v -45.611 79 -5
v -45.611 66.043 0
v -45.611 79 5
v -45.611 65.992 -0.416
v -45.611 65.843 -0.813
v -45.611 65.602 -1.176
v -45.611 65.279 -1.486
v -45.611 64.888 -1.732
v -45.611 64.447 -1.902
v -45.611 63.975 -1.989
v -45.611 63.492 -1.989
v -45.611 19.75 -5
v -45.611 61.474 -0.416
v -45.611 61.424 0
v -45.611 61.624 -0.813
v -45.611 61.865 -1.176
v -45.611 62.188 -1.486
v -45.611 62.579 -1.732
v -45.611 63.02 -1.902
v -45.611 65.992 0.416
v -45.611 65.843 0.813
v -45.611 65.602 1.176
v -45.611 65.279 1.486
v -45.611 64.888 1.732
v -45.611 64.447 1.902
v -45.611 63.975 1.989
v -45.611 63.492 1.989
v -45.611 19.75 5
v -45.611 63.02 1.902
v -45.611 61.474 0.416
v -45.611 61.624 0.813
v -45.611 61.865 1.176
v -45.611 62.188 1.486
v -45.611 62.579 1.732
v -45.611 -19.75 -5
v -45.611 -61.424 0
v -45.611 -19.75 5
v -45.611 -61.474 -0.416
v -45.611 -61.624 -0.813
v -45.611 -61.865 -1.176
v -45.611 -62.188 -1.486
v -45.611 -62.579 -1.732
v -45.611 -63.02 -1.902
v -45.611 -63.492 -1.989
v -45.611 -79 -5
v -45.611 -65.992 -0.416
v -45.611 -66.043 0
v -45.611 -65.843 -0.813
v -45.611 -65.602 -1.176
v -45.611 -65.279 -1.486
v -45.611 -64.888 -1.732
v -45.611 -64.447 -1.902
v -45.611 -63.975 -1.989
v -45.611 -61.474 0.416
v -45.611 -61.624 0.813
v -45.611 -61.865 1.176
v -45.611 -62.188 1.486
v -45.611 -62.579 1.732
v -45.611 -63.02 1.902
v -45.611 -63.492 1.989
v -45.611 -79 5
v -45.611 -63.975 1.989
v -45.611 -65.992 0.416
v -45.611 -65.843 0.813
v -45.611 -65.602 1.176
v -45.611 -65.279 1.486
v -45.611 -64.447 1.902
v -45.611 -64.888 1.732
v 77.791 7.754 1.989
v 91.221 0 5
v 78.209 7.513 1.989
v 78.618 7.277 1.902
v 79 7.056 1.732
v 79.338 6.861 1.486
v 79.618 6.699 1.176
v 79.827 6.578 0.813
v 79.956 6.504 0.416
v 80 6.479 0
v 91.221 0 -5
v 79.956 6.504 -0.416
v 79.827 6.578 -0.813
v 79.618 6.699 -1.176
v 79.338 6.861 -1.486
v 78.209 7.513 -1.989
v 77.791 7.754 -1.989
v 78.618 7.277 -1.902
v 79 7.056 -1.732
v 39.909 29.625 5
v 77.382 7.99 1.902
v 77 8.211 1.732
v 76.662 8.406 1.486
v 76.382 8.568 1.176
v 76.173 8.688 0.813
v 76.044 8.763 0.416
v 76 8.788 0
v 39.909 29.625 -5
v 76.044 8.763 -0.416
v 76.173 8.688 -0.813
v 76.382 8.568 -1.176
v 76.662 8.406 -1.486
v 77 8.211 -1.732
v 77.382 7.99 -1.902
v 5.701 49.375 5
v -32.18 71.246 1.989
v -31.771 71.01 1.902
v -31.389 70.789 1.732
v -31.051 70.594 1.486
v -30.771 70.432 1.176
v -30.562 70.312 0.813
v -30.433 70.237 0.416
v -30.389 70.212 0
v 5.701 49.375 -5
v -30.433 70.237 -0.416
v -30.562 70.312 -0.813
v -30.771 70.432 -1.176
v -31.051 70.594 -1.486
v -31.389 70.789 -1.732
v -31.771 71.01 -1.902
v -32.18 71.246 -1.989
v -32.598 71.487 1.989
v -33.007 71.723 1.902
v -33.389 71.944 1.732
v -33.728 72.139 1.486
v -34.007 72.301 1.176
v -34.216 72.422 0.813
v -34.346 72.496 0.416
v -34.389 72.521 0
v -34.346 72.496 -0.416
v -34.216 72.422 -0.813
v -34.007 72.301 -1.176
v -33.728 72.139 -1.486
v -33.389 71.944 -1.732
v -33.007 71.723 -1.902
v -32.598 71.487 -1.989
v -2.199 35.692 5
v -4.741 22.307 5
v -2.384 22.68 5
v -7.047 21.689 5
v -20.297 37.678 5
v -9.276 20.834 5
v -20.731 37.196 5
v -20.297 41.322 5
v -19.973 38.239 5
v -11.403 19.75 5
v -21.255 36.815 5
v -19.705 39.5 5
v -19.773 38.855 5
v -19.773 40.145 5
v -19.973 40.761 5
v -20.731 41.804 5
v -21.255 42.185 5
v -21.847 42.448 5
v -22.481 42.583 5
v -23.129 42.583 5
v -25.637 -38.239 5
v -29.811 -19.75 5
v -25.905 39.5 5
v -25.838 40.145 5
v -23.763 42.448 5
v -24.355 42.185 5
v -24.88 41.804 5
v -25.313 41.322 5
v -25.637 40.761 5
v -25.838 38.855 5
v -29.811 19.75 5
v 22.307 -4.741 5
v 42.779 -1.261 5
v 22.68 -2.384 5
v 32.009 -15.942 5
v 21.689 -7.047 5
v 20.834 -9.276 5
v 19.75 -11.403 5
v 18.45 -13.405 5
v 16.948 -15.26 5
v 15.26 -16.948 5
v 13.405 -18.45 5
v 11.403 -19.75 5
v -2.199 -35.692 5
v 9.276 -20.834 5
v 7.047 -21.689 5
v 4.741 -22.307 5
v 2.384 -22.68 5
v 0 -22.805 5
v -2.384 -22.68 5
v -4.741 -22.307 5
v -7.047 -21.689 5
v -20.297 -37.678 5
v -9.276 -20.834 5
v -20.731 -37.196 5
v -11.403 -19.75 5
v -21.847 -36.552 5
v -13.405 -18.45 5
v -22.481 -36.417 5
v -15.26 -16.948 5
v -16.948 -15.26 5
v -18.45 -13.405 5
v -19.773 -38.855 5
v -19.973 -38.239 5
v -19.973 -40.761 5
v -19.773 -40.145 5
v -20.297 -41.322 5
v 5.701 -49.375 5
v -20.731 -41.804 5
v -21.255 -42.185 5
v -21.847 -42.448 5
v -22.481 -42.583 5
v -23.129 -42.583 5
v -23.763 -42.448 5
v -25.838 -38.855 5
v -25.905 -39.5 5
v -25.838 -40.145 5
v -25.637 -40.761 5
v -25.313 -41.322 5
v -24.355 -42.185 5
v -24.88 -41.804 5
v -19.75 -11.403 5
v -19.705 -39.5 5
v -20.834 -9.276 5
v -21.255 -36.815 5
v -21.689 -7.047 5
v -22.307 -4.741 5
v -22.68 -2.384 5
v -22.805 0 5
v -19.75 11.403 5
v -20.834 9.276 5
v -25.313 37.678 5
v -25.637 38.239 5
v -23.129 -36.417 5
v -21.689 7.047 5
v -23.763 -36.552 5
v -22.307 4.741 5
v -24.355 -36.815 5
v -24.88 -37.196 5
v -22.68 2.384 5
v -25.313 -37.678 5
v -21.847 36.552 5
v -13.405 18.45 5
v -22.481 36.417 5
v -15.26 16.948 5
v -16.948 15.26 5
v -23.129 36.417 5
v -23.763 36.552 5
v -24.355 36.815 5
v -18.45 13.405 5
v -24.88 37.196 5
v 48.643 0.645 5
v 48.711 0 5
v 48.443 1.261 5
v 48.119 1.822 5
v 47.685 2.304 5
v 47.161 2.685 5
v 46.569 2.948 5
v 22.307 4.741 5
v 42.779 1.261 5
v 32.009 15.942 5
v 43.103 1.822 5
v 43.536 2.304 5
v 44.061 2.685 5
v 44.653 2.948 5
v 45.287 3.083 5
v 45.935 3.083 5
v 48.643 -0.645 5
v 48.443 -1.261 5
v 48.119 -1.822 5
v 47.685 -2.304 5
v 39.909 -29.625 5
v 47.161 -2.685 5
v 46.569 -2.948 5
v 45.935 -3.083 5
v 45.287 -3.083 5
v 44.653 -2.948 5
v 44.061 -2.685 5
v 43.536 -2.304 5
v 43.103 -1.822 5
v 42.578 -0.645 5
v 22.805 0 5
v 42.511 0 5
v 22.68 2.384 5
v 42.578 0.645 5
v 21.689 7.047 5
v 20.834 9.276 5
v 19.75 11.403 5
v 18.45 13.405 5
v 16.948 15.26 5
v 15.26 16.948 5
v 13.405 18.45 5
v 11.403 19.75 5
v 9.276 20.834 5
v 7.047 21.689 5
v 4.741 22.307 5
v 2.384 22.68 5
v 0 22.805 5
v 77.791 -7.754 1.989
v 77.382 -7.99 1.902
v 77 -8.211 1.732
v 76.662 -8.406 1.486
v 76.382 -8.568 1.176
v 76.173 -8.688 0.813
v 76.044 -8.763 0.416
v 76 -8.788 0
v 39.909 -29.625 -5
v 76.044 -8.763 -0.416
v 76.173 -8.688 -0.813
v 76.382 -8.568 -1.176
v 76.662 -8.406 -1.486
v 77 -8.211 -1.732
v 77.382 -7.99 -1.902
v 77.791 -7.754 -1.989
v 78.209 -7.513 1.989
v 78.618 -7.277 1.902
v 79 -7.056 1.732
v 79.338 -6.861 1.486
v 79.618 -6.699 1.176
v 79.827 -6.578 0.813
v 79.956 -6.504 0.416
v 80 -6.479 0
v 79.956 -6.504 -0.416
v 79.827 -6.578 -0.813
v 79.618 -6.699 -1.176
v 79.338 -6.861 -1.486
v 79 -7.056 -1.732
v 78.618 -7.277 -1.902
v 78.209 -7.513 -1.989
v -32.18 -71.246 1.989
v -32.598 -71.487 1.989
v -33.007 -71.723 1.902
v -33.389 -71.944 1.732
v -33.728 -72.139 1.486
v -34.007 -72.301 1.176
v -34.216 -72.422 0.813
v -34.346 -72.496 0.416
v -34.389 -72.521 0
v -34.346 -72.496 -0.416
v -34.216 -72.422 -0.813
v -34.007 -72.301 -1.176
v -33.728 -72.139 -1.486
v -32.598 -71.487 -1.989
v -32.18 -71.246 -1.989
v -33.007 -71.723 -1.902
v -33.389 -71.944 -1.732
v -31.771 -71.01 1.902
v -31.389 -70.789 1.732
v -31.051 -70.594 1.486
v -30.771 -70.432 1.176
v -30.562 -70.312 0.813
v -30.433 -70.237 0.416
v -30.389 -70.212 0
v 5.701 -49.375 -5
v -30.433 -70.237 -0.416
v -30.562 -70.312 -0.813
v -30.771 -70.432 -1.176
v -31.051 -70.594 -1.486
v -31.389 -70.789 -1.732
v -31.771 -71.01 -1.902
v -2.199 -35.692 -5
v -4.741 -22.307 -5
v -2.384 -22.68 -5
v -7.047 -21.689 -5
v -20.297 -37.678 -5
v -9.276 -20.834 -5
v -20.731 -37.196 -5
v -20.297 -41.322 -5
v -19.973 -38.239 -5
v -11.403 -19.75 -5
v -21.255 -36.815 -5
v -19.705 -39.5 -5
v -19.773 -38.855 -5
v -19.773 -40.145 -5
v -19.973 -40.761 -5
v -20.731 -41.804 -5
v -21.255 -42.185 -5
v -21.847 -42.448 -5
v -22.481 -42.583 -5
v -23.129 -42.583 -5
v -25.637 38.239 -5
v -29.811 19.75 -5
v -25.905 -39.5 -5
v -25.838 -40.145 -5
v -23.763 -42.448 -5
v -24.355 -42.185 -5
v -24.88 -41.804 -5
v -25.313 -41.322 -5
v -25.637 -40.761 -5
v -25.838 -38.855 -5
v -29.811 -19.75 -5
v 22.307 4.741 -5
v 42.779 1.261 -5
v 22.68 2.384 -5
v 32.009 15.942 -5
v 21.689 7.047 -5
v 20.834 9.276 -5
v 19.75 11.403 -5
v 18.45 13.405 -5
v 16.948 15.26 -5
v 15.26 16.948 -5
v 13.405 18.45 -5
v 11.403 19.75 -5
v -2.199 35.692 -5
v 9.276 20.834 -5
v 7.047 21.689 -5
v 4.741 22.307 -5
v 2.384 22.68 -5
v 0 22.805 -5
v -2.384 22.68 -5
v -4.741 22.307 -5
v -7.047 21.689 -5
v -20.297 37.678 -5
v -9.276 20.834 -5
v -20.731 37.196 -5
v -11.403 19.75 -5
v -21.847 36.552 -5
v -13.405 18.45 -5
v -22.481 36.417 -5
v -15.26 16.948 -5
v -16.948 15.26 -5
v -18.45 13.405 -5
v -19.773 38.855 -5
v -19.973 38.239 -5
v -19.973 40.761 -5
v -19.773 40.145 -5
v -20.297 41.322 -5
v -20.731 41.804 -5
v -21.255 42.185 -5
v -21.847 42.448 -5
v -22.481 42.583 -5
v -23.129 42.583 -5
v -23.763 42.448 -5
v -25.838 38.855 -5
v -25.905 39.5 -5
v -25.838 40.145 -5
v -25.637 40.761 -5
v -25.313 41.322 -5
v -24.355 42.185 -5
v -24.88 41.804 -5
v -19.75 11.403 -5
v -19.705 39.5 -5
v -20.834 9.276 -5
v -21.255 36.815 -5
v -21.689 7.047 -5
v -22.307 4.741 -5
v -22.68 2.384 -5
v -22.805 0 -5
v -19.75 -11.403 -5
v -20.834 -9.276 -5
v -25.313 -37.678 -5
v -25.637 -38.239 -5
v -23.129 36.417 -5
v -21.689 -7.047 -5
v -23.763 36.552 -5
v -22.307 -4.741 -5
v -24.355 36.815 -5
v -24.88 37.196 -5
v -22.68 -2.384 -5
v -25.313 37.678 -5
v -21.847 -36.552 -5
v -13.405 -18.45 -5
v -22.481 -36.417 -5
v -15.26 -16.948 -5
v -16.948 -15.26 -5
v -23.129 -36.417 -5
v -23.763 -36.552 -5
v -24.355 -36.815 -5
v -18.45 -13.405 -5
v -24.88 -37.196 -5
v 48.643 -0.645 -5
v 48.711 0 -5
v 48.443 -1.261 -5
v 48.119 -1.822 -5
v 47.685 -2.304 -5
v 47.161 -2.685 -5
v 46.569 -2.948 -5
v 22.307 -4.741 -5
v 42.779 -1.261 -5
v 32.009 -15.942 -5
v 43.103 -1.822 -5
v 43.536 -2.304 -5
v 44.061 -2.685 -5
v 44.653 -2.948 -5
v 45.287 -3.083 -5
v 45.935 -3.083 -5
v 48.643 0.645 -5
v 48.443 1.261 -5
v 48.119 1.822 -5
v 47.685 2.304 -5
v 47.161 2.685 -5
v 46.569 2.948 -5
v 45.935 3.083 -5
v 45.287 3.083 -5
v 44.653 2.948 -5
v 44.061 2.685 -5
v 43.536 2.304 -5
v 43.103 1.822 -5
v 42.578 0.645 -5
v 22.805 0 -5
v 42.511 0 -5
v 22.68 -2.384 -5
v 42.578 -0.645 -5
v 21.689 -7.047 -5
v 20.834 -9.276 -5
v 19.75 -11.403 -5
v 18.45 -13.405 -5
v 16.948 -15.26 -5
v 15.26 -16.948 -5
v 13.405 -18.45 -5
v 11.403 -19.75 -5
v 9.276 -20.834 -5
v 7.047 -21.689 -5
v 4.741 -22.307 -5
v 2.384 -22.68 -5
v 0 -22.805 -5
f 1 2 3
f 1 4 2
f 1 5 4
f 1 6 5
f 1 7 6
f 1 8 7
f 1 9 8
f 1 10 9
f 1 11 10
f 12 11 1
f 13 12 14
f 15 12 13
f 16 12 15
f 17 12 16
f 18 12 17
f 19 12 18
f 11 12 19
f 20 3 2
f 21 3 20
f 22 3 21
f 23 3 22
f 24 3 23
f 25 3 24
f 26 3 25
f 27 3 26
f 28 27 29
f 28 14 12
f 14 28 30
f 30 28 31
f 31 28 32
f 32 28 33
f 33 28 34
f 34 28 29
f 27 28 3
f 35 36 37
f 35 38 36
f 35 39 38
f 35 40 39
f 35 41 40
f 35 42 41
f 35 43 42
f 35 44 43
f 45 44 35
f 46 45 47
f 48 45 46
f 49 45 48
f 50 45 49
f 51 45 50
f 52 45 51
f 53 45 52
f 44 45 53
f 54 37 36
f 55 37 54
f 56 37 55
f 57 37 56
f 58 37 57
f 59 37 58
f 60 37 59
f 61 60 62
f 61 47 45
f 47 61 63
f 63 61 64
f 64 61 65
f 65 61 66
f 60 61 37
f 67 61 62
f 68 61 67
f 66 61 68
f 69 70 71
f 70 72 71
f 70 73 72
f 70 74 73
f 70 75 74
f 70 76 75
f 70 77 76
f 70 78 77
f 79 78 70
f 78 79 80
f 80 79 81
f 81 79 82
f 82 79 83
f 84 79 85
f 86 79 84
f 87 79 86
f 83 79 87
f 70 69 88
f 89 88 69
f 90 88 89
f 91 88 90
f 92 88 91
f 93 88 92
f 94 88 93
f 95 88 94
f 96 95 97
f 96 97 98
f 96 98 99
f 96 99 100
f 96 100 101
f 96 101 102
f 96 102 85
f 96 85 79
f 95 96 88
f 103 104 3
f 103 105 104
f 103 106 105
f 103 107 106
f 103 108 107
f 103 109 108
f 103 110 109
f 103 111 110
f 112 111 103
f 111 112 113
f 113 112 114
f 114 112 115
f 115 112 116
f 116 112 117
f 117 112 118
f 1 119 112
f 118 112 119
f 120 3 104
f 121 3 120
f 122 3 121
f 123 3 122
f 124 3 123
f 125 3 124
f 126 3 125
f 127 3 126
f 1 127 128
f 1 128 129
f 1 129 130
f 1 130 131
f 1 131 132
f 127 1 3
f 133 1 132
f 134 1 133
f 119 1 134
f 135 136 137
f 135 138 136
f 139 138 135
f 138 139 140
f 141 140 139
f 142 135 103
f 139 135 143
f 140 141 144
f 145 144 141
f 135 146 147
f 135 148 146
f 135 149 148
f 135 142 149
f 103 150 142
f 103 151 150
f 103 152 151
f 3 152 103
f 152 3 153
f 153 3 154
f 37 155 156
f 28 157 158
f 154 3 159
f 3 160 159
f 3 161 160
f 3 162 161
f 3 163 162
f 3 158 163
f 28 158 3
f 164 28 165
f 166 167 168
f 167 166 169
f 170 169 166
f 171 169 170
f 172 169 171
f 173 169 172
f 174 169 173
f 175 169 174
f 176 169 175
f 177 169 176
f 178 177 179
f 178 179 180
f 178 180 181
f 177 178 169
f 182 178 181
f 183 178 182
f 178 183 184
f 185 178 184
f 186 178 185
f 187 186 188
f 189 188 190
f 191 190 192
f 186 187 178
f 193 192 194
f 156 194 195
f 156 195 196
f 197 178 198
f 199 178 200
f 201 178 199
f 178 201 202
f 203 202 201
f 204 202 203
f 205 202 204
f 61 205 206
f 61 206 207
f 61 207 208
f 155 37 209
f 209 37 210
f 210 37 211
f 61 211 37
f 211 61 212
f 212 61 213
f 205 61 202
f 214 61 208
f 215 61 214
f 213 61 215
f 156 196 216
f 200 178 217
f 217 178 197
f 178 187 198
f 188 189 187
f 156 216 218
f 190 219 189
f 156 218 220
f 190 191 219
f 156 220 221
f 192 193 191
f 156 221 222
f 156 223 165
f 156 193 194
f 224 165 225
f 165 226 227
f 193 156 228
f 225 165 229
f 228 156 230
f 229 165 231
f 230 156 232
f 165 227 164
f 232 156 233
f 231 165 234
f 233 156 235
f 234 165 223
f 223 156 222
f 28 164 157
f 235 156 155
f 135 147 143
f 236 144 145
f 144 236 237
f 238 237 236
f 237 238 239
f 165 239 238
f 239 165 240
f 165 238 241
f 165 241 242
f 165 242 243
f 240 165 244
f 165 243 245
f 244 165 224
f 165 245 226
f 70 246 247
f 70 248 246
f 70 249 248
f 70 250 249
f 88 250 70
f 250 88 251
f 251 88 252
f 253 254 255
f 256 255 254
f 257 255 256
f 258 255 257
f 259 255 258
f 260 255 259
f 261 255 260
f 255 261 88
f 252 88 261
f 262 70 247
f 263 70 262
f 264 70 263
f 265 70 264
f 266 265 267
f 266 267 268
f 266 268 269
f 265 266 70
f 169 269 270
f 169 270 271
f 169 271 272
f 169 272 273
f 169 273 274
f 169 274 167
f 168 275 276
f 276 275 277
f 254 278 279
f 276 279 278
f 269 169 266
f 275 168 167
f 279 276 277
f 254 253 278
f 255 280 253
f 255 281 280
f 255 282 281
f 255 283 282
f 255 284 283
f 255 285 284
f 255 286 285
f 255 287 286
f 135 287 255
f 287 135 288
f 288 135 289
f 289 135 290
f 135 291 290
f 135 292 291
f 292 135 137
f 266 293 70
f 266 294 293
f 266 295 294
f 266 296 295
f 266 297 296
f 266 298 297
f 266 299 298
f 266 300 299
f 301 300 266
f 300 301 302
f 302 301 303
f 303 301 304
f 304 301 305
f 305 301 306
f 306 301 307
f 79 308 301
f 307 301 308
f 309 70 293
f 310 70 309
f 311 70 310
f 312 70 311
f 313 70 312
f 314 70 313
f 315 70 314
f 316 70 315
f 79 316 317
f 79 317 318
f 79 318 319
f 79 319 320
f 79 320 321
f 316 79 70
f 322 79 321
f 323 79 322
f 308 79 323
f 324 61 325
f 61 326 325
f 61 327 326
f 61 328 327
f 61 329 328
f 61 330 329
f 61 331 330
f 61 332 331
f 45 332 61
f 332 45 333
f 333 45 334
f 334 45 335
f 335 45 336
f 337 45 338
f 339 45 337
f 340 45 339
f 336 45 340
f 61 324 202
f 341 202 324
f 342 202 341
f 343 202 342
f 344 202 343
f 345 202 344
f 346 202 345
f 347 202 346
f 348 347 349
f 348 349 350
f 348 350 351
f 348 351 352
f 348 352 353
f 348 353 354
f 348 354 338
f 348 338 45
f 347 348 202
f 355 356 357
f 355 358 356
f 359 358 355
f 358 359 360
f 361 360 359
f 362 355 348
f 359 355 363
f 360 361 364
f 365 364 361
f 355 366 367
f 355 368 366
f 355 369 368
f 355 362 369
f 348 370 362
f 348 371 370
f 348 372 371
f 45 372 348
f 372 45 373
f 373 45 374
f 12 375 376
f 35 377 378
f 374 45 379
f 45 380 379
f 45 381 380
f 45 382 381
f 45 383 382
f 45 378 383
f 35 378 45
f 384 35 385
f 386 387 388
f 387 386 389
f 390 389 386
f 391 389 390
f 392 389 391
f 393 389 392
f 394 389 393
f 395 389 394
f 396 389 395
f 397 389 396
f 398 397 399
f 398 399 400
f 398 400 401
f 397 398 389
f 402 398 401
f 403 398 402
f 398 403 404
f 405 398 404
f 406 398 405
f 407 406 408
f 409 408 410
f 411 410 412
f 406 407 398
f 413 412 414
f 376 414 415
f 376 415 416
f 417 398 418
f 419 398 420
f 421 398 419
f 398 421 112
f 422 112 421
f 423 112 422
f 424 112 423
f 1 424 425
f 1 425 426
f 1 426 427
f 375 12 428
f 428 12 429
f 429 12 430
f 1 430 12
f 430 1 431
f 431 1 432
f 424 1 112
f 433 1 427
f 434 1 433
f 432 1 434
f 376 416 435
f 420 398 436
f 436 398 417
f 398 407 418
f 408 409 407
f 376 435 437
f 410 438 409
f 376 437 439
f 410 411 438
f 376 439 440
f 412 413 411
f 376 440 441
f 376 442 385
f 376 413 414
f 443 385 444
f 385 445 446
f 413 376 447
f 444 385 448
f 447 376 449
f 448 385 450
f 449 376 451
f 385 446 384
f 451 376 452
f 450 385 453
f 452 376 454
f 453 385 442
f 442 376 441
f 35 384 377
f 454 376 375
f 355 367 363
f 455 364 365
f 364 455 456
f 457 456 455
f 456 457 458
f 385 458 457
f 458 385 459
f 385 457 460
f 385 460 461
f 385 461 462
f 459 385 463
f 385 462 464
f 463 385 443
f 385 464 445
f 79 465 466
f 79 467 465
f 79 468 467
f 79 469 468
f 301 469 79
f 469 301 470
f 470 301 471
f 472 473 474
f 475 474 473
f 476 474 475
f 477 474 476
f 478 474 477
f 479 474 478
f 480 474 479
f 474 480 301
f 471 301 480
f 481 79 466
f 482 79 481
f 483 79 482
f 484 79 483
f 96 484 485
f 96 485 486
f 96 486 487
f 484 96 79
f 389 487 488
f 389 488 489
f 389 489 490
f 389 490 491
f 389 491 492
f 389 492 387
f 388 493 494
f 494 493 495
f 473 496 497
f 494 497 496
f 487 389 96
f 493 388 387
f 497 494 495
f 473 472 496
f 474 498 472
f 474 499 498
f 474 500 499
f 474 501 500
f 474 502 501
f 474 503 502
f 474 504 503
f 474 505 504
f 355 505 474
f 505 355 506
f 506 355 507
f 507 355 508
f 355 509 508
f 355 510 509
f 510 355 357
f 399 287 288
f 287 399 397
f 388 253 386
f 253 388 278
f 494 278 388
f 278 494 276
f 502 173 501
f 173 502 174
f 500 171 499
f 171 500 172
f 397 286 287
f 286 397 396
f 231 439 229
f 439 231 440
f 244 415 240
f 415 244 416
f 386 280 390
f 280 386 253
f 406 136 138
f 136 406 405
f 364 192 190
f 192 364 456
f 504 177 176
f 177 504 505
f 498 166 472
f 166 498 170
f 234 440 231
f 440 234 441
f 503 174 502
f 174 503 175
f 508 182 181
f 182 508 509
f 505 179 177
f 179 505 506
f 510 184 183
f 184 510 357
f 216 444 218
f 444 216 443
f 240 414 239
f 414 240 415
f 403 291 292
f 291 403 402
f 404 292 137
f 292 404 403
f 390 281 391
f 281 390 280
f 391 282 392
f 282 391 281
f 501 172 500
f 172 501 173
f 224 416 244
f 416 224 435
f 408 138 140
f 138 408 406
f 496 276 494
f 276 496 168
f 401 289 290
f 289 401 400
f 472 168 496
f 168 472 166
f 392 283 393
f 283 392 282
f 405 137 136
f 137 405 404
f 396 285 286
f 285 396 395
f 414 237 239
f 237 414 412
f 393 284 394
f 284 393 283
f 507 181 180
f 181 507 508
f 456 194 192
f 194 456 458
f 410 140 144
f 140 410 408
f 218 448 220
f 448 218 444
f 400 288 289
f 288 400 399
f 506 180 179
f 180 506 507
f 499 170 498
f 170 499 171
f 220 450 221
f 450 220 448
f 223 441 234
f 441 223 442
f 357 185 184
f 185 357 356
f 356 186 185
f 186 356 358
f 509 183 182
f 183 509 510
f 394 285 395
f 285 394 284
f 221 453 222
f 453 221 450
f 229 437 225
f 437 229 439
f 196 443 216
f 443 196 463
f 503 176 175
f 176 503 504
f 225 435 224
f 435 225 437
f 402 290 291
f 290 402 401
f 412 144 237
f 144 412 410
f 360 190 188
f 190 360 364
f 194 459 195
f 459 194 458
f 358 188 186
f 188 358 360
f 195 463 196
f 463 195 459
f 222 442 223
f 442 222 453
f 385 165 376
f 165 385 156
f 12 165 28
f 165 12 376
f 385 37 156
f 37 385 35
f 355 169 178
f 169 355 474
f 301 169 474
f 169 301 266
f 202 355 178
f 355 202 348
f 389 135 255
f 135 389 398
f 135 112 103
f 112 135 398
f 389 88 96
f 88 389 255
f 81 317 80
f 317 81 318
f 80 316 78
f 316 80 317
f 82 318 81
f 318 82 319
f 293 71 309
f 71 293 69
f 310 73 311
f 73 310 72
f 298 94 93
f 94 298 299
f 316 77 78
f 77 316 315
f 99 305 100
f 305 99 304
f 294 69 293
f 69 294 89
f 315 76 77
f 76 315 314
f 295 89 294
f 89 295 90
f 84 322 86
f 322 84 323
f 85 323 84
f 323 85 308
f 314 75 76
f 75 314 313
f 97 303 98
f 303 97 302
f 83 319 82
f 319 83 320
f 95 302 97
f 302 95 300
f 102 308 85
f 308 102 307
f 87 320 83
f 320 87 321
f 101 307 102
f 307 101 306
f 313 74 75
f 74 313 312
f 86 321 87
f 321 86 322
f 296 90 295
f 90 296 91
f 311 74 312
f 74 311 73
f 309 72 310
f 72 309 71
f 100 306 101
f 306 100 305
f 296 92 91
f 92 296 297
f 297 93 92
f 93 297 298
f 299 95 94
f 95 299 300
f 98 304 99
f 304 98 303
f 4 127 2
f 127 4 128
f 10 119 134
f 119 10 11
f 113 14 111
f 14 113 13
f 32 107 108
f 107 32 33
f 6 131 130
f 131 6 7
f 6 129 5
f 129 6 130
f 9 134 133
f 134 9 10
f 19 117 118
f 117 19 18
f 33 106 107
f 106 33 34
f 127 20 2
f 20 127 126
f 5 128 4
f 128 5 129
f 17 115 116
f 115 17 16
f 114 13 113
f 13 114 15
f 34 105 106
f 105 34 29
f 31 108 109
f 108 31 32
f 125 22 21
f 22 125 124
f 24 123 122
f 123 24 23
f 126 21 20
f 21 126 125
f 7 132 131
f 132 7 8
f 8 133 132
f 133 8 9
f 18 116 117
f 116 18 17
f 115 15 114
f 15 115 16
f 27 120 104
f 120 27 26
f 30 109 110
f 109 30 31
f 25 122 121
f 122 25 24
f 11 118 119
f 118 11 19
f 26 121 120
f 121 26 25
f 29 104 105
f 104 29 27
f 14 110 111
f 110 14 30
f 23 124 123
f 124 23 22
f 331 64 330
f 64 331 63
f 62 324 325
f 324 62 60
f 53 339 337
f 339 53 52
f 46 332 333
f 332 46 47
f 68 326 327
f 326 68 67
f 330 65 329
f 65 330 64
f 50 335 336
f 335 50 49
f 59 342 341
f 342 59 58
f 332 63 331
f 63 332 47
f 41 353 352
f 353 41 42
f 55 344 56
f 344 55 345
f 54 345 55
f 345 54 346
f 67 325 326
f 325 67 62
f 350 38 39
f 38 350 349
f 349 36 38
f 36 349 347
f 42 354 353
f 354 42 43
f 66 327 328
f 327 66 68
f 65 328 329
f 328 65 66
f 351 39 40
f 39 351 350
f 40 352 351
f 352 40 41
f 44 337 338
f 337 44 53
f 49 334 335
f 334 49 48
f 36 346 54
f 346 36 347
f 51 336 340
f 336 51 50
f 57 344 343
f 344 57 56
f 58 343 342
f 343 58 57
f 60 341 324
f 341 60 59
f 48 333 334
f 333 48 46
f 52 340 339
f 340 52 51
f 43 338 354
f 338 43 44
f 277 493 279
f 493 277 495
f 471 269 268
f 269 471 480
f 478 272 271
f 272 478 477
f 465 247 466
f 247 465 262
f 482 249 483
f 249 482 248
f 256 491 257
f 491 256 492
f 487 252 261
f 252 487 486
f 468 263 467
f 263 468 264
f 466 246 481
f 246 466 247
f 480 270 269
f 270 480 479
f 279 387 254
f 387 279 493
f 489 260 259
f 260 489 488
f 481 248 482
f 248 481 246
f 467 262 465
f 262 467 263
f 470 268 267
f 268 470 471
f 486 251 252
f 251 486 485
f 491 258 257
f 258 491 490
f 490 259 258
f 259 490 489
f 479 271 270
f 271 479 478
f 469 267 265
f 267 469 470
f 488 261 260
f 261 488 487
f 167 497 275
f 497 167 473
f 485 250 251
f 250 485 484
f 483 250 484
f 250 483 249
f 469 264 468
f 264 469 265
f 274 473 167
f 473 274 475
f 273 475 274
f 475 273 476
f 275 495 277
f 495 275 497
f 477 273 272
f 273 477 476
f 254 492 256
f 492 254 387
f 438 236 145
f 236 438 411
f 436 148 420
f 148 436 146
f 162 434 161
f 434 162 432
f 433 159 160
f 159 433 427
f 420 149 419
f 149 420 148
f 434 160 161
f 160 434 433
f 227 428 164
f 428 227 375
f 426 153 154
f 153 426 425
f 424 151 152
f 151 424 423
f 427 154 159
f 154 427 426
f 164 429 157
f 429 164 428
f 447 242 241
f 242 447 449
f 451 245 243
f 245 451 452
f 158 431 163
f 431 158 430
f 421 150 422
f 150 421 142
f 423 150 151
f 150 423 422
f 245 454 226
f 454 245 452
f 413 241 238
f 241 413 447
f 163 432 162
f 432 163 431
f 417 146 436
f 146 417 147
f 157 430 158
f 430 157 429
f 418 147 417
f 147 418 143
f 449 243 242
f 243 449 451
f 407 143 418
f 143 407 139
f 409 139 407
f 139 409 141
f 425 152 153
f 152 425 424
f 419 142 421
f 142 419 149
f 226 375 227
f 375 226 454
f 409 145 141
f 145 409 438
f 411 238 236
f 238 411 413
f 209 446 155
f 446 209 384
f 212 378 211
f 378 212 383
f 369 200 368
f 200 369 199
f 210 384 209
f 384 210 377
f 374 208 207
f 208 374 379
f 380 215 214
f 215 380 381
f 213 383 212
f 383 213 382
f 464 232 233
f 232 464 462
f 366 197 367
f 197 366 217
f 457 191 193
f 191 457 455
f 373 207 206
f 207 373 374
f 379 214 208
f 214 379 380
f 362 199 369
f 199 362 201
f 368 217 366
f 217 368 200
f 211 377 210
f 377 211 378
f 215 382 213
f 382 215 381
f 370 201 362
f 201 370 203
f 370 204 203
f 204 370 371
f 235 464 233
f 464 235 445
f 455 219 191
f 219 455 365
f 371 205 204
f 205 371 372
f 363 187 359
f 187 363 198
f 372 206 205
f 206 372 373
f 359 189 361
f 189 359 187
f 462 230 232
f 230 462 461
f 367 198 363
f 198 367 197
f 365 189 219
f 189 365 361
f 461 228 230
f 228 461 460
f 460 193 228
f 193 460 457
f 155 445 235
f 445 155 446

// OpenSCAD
module bodySupport(side = 158, height = 10) {
   
    myRadius = side / (2 * sin(60));

    difference() {
        cylinder(r = myRadius, h = height, $fn=3, center=true);
        
        cylinder(r = 25*myRadius/100, h = height + 2, $fn=60, center=true);
        
        //vertical side slots
        {
            v_slotWidth = side / 4;
            v_slotHeight = height + 6;
            v_slotLength = side / 5;
            translate([-myRadius/2, 0, -0])
                cube([v_slotLength, v_slotWidth, v_slotHeight], center=true);
            rotate(a=[0, 0, 120])
                translate([-myRadius/2, 0, -0])
                    cube([v_slotLength, v_slotWidth, v_slotHeight], center=true);
            rotate(a=[0, 0, 240])
                translate([-myRadius/2, 0, -0])
                    cube([v_slotLength, v_slotWidth, v_slotHeight], center=true);
        }
        
    //body's transversal bolt roles
    translate([78, 0, 0]) {
        rotate(a=[-90, 0, 0])
            cylinder(r = 2, h = 20, $fn=30, center=true);
            
       
    }
    rotate(a=[0, 0, 120])
        translate([78, 0, 0]) {
            rotate(a=[-90, 0, 0])
                cylinder(r = 2, h = 20, $fn=30, center=true);
                
            
        }
    rotate(a=[0, 0, 240])
        translate([78, 0, 0]) {
            rotate(a=[-90, 0, 0])
                cylinder(r = 2, h = 20, $fn=30, center=true);
                
            
        }
        
        translate([myRadius/2, 0, 0]) {
            cylinder(r = 3.1, h = height * 2, $fn=30, center=true);
        }
        
        rotate(a=[0, 0, 120])
            translate([myRadius/2, 0, 0]) {
                cylinder(r = 3.1, h = height * 2, $fn=30, center=true);
            }
        
        rotate(a=[0, 0, 240])
            translate([myRadius/2, 0, 0]) {
                cylinder(r = 3.1, h = height * 2, $fn=30, center=true);
            }
    }
    
}

bodySupport();
